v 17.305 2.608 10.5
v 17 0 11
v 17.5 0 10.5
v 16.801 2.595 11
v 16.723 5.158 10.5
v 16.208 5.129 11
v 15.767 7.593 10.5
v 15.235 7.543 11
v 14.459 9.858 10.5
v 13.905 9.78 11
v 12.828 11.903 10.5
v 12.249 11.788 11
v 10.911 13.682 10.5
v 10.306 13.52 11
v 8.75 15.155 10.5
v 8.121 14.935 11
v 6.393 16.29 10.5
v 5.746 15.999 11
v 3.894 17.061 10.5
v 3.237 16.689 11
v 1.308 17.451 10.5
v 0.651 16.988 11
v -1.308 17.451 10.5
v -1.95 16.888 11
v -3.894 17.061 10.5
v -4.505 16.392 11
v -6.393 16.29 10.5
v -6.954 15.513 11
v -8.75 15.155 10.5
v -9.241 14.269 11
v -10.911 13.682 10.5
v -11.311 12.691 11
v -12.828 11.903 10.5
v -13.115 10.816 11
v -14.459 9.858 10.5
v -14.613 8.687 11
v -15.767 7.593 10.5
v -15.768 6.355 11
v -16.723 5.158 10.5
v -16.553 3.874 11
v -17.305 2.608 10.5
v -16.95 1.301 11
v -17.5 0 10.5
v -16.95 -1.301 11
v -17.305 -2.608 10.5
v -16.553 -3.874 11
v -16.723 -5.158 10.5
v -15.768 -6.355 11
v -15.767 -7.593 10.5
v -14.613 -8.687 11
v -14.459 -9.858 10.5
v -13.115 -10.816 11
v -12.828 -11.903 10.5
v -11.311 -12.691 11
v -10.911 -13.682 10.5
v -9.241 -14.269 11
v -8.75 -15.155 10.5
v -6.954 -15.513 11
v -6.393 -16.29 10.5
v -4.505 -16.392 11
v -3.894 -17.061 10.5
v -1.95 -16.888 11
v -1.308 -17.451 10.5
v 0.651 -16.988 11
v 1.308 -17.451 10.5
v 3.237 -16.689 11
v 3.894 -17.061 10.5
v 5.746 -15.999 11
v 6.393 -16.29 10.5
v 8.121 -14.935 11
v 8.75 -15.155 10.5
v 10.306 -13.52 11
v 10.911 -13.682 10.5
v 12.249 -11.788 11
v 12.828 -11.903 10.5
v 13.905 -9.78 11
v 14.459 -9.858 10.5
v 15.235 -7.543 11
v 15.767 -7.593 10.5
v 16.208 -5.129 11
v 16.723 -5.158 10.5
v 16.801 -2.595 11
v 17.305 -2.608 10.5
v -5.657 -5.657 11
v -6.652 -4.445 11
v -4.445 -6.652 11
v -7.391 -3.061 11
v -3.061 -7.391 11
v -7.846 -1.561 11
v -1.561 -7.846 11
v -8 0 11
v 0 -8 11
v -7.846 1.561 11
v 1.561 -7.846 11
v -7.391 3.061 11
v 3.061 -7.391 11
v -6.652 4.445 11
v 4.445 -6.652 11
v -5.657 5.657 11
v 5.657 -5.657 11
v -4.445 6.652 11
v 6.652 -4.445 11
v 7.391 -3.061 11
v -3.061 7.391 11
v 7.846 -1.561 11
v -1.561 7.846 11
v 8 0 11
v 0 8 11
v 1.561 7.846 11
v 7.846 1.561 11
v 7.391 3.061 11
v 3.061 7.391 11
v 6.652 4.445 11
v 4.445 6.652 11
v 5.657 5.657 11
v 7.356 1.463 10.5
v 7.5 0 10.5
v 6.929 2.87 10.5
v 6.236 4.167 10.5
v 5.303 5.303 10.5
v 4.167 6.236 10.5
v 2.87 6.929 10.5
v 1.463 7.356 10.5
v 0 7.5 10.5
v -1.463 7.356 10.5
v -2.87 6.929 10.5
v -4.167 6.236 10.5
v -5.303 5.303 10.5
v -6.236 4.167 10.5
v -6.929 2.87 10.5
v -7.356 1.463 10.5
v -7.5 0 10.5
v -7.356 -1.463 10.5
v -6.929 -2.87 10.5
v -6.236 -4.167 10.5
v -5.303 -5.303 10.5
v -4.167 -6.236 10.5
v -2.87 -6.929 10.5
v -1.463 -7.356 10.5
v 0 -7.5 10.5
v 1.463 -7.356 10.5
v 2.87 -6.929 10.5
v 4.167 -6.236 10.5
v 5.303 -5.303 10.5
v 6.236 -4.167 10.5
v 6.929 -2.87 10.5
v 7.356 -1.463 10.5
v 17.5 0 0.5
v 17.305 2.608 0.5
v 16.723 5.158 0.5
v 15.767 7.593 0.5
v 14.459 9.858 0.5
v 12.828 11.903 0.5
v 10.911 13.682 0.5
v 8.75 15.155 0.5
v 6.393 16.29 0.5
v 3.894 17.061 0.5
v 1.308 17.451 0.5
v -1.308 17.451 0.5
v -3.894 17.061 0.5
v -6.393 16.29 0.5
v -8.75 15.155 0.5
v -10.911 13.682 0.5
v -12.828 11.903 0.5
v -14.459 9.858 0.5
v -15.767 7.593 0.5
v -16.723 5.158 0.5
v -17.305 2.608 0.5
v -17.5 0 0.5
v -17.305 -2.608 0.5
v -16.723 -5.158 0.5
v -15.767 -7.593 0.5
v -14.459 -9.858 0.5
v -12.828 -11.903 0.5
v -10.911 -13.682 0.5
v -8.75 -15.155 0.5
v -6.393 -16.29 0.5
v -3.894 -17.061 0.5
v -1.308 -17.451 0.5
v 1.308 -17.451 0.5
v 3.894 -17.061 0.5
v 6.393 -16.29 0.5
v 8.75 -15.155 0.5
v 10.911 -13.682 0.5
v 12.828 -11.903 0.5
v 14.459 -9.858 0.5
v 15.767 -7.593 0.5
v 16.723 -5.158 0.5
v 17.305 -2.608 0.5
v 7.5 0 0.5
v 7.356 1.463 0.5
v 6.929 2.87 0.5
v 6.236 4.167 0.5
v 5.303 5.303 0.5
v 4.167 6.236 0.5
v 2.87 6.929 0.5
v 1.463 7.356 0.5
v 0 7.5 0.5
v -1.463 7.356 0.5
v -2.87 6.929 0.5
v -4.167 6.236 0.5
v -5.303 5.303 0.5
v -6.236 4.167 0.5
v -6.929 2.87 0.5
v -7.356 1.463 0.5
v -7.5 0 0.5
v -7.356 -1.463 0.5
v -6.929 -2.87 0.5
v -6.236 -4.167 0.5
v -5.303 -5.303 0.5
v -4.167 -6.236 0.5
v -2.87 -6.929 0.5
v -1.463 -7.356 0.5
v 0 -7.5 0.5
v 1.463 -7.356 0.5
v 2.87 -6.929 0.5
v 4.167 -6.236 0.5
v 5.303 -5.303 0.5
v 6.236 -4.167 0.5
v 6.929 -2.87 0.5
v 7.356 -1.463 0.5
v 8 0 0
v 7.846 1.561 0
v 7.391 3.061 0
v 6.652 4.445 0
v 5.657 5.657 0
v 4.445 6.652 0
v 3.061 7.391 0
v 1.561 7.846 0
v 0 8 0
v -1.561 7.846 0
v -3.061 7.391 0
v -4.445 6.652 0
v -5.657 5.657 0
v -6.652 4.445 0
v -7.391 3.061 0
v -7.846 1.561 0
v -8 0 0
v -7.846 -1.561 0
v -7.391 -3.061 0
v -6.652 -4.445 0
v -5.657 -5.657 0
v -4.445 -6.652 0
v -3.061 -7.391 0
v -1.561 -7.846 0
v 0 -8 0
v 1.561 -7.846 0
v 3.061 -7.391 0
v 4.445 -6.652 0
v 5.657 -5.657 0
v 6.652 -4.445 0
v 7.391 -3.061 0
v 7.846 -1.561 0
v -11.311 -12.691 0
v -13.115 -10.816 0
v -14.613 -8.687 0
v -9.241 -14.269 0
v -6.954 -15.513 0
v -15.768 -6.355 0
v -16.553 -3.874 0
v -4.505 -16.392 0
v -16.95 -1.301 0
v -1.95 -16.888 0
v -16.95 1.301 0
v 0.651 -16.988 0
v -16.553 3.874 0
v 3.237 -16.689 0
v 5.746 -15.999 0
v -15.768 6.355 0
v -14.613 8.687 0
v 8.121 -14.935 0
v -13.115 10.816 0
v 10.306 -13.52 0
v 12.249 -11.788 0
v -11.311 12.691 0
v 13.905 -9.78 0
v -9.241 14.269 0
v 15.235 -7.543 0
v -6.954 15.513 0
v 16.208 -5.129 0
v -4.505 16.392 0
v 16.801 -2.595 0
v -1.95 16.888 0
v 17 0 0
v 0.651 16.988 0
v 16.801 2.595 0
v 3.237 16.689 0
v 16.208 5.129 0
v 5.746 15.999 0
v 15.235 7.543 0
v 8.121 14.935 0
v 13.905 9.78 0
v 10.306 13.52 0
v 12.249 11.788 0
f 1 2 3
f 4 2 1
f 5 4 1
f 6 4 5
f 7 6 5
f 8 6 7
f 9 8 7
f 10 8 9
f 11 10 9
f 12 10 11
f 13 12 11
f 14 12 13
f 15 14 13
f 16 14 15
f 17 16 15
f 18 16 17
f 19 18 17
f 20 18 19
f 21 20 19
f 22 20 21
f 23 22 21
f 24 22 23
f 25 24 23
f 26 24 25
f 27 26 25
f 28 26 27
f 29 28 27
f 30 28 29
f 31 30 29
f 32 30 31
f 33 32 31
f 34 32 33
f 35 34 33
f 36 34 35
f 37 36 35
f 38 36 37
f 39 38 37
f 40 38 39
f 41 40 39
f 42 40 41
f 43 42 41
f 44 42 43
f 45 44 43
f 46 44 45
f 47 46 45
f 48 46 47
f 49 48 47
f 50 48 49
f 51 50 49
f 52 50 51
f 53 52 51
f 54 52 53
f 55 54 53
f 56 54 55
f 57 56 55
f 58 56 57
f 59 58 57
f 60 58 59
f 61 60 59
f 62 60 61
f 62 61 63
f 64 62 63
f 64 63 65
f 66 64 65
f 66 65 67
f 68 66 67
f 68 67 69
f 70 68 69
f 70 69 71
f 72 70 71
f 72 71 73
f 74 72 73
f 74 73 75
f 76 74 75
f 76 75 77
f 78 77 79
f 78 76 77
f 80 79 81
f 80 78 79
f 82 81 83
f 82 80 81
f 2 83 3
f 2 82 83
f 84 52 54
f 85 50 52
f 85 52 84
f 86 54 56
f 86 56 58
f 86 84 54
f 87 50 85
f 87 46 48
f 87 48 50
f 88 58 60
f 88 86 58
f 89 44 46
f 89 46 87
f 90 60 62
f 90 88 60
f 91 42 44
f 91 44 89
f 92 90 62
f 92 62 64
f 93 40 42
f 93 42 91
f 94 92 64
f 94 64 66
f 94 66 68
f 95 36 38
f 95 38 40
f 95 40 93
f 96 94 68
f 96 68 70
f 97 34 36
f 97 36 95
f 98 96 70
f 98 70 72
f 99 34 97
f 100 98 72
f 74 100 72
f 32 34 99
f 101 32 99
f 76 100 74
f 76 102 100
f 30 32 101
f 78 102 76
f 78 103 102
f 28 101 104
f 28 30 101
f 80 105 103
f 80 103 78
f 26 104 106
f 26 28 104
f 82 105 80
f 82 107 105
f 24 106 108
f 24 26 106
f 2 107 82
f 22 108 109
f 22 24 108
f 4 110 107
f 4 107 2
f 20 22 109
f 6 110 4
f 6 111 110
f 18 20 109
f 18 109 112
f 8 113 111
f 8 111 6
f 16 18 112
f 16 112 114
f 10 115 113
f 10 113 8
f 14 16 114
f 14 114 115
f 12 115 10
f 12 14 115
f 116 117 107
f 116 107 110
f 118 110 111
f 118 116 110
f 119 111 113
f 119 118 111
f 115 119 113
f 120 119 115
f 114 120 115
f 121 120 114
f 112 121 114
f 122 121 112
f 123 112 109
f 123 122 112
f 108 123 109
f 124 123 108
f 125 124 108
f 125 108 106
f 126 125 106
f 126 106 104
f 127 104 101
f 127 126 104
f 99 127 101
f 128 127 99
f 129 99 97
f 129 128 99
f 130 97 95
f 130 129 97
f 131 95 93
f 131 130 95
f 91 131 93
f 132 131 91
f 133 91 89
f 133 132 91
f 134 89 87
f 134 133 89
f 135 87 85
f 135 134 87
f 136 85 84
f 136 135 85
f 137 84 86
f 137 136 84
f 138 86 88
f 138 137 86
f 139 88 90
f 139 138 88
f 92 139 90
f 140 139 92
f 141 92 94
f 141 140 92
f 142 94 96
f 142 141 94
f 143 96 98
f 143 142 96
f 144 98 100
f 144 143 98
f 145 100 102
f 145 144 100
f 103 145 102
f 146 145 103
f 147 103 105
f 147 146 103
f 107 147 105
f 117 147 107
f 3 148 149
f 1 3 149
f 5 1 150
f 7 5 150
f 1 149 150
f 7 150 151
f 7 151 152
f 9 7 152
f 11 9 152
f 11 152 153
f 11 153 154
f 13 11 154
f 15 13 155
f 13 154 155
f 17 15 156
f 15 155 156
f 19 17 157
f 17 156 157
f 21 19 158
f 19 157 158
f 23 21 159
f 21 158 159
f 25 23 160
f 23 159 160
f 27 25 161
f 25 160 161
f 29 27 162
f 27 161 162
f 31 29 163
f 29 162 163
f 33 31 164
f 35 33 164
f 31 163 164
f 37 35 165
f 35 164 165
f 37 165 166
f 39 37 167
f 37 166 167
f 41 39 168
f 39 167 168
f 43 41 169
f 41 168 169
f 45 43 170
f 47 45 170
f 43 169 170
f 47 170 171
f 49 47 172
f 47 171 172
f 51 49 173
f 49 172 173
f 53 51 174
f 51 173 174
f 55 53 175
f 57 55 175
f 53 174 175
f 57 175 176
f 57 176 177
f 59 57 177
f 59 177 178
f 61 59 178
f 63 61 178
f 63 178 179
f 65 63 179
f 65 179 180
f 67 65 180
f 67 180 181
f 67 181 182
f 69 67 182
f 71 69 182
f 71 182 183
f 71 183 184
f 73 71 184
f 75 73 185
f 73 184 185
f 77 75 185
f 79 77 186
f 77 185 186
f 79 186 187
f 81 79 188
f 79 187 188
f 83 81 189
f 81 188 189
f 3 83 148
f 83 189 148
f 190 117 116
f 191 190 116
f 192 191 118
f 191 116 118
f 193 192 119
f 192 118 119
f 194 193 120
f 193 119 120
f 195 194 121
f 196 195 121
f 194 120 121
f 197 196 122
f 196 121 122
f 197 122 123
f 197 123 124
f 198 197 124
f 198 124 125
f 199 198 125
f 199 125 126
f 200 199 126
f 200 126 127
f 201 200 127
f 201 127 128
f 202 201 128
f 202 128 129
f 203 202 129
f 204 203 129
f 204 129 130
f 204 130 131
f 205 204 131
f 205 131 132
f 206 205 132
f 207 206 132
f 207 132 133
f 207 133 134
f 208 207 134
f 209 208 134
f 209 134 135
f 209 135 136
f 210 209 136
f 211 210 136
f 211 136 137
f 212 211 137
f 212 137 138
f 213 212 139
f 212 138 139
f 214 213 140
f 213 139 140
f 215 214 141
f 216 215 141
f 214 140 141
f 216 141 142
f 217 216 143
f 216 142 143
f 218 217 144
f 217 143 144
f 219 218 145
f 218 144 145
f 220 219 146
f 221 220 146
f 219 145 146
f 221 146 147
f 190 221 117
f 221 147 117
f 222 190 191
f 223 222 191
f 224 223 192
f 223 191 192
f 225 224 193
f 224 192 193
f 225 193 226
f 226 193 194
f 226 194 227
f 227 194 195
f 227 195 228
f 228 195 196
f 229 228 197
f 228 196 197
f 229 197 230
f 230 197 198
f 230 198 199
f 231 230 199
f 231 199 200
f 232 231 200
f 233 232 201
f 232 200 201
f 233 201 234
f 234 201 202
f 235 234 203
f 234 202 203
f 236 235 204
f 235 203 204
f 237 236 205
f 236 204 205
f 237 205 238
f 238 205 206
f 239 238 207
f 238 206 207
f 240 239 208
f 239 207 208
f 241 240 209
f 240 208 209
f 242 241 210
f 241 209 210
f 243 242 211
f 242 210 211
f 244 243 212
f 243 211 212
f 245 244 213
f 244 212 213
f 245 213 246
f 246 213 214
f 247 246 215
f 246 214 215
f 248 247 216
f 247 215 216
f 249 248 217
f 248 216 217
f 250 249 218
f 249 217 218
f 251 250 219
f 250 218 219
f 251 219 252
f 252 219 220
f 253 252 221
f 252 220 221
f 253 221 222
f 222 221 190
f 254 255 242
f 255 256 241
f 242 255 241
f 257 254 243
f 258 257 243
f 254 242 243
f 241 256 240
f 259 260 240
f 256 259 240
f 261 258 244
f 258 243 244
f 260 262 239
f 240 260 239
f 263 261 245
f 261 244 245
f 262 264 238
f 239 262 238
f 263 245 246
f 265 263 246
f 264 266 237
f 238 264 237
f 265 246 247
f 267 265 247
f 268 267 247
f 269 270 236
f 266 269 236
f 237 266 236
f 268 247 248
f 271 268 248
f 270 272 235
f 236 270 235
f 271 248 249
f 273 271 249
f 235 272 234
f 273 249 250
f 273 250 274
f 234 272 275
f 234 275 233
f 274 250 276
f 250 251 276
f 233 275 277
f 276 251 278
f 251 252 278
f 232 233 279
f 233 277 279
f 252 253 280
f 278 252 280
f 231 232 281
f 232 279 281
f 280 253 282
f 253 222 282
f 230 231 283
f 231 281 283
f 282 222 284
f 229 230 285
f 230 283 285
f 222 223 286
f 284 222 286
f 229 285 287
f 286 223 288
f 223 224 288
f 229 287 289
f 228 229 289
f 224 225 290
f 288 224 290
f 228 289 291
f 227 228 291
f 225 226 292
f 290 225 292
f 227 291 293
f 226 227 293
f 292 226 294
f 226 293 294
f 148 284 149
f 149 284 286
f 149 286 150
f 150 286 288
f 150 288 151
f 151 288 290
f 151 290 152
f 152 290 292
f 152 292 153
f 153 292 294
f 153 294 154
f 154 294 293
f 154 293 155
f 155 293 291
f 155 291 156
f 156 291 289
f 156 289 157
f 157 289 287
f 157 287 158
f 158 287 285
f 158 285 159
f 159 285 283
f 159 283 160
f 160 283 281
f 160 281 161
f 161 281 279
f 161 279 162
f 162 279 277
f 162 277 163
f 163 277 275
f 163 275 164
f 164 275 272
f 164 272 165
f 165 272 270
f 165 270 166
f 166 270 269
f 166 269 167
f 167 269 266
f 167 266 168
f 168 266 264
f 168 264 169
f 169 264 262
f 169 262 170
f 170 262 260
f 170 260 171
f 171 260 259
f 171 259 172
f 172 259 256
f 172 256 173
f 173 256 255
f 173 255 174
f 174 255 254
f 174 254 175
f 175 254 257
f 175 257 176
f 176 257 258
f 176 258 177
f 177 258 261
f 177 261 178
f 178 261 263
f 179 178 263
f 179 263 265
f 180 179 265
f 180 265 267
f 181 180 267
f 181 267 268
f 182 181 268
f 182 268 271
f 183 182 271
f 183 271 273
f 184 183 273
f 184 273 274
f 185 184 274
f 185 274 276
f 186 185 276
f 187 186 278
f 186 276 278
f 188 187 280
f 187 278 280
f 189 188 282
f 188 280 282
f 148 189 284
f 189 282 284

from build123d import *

# Parameters (mm, degrees)
F0_R     = 17.5
F1_DEPTH = 11
F2_SIZE  = 0.5
F3_R     = 7.5
F4_DEPTH = 40.7
F5_SIZE  = 0.5


with BuildPart() as f1:
    # F0 (on Top) → F1 (new body)
    with BuildSketch(Plane.XY):
        Circle(F0_R)
    extrude(amount=F1_DEPTH)

    # F2
    f2_edges = [f1.edges().sort_by_distance(p)[0] for p in [
        (-17.5, 0, 11),
        (-17.5, 0, 0),
    ]]
    chamfer(f2_edges, length=F2_SIZE)

    # F3 (on face) → F4 (cut)
    with BuildSketch(Plane.XY.offset(11)):
        Circle(F3_R)
    extrude(amount=-F4_DEPTH, mode=Mode.SUBTRACT)

    # F5
    f5_edges = [f1.edges().sort_by_distance(p)[0] for p in [
        (-7.5, 0, 11),
        (-7.5, 0, 0),
    ]]
    chamfer(f5_edges, length=F5_SIZE)


solid = f1.part
